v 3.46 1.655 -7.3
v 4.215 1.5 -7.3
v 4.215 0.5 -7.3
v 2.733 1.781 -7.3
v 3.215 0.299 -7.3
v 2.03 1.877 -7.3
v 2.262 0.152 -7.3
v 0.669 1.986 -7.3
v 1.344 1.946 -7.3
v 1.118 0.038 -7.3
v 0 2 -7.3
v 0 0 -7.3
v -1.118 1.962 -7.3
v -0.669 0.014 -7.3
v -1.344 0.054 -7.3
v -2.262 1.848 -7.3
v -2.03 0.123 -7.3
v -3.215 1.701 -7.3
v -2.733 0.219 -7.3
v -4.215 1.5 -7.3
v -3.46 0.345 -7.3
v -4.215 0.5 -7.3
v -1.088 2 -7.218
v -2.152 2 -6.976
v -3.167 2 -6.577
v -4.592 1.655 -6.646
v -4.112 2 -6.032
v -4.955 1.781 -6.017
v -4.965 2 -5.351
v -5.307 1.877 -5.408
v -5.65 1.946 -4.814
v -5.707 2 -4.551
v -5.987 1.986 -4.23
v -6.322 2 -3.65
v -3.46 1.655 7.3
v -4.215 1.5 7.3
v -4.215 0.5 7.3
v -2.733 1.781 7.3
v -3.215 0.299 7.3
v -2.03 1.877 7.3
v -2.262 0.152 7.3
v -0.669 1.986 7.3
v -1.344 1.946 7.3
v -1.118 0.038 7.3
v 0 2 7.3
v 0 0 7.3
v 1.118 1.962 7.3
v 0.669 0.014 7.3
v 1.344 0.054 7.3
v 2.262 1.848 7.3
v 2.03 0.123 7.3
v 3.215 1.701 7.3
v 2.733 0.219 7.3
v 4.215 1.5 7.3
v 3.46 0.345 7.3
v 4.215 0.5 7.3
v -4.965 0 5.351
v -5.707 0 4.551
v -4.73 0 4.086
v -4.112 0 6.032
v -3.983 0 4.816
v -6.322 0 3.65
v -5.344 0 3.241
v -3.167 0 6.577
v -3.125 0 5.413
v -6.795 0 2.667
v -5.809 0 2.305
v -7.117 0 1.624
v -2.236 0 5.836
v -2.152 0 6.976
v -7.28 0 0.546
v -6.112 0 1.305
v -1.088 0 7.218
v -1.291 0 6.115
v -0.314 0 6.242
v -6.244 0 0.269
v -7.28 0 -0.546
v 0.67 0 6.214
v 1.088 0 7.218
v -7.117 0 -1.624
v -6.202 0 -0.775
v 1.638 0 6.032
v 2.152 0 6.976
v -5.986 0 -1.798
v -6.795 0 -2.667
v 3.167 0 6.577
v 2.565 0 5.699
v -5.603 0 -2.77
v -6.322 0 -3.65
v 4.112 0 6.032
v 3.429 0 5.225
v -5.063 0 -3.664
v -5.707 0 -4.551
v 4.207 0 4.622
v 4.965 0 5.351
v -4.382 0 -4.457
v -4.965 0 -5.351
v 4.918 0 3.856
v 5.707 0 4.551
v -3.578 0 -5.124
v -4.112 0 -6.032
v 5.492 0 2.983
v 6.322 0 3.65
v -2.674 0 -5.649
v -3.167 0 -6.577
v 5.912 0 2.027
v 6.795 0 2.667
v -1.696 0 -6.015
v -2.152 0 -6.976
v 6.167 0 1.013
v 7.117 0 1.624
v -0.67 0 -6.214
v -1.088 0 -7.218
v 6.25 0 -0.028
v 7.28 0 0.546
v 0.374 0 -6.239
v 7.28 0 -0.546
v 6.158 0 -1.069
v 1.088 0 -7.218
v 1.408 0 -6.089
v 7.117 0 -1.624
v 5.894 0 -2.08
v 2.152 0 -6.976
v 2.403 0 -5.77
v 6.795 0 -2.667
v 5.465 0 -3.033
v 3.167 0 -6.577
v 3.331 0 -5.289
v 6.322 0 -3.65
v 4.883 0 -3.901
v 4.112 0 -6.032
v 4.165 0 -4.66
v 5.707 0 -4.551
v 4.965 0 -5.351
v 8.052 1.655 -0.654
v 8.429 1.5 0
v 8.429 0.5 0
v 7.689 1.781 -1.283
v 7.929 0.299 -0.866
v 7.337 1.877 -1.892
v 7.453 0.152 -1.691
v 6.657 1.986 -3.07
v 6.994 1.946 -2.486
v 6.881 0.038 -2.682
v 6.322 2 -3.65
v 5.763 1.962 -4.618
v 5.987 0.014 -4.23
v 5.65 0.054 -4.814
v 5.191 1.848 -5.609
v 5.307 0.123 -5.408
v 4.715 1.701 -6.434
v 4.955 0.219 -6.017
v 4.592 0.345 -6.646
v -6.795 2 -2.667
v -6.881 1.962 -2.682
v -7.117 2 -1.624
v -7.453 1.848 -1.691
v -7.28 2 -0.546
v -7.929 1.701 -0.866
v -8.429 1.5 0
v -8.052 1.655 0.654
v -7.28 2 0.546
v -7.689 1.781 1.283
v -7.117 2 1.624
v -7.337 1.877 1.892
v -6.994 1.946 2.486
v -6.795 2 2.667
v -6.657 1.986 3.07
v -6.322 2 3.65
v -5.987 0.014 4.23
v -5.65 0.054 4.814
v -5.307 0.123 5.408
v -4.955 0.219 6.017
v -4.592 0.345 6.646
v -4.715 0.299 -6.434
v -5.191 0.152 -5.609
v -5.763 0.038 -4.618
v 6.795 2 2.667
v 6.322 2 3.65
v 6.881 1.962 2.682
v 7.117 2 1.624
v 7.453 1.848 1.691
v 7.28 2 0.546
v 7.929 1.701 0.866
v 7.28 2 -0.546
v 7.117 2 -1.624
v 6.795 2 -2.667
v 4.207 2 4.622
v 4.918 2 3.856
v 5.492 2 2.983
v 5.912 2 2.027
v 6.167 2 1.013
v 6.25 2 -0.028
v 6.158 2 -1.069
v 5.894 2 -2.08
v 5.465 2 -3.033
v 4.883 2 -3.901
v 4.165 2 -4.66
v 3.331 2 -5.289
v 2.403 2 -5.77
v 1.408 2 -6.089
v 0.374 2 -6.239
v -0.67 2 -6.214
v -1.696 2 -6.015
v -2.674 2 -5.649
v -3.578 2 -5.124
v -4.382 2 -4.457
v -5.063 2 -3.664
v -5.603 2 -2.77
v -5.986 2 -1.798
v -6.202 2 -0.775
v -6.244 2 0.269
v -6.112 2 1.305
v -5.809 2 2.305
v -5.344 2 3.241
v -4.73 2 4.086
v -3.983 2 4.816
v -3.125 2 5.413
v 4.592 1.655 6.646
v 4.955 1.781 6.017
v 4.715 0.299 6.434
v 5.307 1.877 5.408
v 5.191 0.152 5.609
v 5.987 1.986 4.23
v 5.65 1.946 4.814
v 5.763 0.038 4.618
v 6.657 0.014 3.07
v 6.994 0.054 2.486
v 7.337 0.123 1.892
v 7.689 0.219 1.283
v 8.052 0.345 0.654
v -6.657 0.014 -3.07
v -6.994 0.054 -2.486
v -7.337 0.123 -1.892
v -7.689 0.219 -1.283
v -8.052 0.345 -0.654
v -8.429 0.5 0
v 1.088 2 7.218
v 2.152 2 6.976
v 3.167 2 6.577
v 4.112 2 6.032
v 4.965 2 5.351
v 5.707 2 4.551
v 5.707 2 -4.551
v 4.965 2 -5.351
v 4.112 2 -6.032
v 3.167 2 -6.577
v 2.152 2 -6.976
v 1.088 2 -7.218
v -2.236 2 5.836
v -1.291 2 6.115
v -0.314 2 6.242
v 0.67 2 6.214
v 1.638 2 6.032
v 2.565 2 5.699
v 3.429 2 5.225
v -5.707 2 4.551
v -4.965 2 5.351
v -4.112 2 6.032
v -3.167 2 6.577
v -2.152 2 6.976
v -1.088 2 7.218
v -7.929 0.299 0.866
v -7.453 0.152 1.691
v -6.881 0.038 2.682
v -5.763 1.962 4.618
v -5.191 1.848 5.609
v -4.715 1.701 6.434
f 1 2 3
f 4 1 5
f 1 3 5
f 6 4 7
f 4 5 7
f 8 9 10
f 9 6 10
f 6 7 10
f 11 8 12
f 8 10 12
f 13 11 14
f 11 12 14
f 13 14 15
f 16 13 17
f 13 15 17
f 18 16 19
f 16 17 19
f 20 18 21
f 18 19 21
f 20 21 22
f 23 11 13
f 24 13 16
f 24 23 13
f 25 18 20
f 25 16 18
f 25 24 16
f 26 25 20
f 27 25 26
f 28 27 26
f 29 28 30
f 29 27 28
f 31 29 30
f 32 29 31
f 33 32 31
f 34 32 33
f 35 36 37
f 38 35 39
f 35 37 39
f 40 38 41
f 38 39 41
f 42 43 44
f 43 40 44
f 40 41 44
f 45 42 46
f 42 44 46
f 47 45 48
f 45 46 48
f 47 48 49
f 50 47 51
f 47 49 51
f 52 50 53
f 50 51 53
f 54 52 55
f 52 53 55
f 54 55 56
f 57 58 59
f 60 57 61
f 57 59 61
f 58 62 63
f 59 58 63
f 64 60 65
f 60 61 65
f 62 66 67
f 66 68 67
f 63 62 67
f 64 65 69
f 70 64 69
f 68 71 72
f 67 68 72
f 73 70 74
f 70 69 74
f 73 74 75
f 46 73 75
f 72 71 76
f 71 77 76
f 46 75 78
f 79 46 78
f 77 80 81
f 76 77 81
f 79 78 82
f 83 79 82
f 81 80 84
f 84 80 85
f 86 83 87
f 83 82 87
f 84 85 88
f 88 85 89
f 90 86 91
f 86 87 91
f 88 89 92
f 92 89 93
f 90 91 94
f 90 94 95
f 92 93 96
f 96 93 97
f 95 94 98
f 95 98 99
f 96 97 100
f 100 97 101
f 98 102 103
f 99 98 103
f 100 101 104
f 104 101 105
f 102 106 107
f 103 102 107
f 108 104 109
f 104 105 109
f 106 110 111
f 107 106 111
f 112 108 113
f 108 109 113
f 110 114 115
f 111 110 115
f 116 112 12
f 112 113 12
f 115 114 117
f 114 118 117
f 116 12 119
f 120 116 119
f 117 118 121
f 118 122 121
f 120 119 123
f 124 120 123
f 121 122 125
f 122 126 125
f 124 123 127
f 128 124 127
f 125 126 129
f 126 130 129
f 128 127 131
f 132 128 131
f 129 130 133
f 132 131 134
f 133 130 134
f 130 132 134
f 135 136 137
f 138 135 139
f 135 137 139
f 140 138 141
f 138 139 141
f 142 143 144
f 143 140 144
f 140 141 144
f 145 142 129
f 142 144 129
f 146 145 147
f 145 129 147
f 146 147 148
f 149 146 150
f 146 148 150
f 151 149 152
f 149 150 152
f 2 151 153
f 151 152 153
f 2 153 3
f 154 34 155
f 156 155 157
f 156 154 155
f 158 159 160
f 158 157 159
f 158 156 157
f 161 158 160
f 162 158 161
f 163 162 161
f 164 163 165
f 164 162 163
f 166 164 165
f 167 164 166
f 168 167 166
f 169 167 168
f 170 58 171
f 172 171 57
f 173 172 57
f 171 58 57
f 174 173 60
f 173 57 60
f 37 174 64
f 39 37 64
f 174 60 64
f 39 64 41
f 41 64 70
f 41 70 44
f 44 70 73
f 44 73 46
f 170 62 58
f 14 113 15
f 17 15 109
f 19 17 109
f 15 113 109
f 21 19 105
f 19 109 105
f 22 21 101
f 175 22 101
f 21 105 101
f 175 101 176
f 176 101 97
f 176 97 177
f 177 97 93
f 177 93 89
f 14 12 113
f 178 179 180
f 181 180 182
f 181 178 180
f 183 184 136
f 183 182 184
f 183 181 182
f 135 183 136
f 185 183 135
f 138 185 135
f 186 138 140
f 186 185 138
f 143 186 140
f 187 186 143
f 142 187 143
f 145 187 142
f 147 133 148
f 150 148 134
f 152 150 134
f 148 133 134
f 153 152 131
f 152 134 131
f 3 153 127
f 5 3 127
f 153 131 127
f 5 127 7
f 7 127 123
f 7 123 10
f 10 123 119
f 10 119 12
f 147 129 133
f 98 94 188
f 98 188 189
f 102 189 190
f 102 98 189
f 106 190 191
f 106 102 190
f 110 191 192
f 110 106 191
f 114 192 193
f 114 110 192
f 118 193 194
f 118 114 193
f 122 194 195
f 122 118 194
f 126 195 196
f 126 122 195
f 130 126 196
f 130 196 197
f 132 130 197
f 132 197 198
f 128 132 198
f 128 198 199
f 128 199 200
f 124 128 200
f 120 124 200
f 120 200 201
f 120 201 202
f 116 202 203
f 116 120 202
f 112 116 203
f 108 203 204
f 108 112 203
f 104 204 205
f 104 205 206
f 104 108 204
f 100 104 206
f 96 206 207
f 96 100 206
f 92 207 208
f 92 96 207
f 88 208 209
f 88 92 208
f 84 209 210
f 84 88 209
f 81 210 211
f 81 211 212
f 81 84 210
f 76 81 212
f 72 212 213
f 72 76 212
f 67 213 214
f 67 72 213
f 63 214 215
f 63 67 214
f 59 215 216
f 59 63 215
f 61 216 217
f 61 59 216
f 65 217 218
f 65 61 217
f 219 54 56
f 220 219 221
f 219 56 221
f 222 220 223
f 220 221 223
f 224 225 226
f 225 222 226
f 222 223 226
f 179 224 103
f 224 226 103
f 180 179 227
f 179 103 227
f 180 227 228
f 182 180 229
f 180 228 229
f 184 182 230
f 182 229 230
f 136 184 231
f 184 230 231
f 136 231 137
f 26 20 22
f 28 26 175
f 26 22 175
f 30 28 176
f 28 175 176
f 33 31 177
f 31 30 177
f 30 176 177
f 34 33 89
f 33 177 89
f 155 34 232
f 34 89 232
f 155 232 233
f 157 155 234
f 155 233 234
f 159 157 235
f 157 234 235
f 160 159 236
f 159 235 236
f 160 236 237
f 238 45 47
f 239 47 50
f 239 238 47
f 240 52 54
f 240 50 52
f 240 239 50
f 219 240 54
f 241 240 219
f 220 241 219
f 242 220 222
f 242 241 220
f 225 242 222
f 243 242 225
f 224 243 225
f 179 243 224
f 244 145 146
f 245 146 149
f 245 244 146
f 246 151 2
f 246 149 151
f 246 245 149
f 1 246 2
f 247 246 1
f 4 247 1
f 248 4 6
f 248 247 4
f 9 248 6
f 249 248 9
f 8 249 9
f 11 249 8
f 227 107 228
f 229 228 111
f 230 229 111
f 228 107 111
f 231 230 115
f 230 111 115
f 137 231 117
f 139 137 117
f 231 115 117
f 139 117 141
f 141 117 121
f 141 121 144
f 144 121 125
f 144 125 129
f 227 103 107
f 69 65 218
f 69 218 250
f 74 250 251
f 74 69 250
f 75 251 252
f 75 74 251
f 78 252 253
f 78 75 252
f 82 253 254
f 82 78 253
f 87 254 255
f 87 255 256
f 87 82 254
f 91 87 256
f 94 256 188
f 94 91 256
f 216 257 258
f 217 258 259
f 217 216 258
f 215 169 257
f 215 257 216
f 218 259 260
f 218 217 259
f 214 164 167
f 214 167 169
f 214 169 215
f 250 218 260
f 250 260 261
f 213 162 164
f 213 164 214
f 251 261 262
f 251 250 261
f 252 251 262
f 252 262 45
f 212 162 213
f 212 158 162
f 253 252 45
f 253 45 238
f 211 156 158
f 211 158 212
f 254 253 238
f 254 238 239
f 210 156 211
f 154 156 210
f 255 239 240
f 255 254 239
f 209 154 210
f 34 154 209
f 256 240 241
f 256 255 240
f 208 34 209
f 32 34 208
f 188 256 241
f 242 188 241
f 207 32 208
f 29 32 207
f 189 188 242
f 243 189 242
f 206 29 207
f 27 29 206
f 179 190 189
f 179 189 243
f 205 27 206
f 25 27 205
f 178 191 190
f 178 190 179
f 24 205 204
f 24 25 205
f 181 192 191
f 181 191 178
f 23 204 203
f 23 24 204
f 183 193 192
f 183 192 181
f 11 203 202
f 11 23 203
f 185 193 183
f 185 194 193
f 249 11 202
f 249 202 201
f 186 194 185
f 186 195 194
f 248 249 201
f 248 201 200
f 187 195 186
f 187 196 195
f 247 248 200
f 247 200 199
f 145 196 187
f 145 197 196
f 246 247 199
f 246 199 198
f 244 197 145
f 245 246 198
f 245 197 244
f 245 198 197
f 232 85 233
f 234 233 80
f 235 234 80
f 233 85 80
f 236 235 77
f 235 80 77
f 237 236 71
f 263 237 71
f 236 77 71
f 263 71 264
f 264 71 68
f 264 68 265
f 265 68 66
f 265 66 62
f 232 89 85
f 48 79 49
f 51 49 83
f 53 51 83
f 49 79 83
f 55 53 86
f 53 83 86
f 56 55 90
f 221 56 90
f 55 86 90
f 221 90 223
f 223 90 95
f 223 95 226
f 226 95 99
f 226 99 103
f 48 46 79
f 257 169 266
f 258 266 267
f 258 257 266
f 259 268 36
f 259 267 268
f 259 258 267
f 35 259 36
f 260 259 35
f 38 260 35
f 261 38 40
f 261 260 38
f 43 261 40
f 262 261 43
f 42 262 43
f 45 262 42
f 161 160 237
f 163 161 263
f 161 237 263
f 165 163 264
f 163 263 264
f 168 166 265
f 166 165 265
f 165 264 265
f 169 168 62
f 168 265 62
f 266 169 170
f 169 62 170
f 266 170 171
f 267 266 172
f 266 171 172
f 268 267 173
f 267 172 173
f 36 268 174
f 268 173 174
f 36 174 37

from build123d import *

# Parameters (mm, degrees)
SKETCH1_R            = 6
BOSS_EXTRUDE1_DEPTH  = 2
CUT_SWEEP1_OUTLINE_R = 6
CUT_SWEEP1_DEPTH     = 2


# Read off the part's stored shape, not the designer's step: Cut-Sweep1
with BuildPart() as part:
    # Sketch1 → Boss-Extrude1 (new body)
    with BuildSketch(Plane(origin=(0, 0, 0), x_dir=(1, 0, 0), z_dir=(0, 1, 0))):
        Polygon((8.42931393, 0), (4.214656965, 7.3), (-4.214656965, 7.3), (-8.42931393, 0), (-4.214656965, -7.3), (4.214656965, -7.3), align=None)
        with Locations(Location((0, 0, 0), (0, 0, 270))):
            Circle(SKETCH1_R, mode=Mode.SUBTRACT)
    extrude(amount=BOSS_EXTRUDE1_DEPTH)

    # Sketch3 → Cut-Revolve1 (revolve, cut)
    with BuildSketch(Plane.XY):
        Polygon((-8.42931393, 0), (-8.42931393, 0.5), (-7.3, 0), align=None)
        Polygon((-8.42931393, 2), (-8.42931393, 1.5), (-7.3, 2), align=None)
    revolve(axis=Axis((0, 0, 0), (0, 1, 0)), mode=Mode.SUBTRACT)

    # Cut-Sweep1 outline → Cut-Sweep1 (cut)
    with BuildSketch(Plane(origin=(0, 0, 0), x_dir=(1, 0, 0), z_dir=(0, 1, 0))):
        with BuildLine():
            ThreePointArc((4.207228142, -4.621875307), (-0.67017838, 6.213964993), (-3.125, -5.412658774))
            ThreePointArc((-3.125, -5.412658774), (0.67017838, -6.213964993), (4.207228142, -4.621875307))
        make_face()
        Circle(CUT_SWEEP1_OUTLINE_R, mode=Mode.SUBTRACT)
    extrude(amount=CUT_SWEEP1_DEPTH, mode=Mode.SUBTRACT)


solid = part.part
